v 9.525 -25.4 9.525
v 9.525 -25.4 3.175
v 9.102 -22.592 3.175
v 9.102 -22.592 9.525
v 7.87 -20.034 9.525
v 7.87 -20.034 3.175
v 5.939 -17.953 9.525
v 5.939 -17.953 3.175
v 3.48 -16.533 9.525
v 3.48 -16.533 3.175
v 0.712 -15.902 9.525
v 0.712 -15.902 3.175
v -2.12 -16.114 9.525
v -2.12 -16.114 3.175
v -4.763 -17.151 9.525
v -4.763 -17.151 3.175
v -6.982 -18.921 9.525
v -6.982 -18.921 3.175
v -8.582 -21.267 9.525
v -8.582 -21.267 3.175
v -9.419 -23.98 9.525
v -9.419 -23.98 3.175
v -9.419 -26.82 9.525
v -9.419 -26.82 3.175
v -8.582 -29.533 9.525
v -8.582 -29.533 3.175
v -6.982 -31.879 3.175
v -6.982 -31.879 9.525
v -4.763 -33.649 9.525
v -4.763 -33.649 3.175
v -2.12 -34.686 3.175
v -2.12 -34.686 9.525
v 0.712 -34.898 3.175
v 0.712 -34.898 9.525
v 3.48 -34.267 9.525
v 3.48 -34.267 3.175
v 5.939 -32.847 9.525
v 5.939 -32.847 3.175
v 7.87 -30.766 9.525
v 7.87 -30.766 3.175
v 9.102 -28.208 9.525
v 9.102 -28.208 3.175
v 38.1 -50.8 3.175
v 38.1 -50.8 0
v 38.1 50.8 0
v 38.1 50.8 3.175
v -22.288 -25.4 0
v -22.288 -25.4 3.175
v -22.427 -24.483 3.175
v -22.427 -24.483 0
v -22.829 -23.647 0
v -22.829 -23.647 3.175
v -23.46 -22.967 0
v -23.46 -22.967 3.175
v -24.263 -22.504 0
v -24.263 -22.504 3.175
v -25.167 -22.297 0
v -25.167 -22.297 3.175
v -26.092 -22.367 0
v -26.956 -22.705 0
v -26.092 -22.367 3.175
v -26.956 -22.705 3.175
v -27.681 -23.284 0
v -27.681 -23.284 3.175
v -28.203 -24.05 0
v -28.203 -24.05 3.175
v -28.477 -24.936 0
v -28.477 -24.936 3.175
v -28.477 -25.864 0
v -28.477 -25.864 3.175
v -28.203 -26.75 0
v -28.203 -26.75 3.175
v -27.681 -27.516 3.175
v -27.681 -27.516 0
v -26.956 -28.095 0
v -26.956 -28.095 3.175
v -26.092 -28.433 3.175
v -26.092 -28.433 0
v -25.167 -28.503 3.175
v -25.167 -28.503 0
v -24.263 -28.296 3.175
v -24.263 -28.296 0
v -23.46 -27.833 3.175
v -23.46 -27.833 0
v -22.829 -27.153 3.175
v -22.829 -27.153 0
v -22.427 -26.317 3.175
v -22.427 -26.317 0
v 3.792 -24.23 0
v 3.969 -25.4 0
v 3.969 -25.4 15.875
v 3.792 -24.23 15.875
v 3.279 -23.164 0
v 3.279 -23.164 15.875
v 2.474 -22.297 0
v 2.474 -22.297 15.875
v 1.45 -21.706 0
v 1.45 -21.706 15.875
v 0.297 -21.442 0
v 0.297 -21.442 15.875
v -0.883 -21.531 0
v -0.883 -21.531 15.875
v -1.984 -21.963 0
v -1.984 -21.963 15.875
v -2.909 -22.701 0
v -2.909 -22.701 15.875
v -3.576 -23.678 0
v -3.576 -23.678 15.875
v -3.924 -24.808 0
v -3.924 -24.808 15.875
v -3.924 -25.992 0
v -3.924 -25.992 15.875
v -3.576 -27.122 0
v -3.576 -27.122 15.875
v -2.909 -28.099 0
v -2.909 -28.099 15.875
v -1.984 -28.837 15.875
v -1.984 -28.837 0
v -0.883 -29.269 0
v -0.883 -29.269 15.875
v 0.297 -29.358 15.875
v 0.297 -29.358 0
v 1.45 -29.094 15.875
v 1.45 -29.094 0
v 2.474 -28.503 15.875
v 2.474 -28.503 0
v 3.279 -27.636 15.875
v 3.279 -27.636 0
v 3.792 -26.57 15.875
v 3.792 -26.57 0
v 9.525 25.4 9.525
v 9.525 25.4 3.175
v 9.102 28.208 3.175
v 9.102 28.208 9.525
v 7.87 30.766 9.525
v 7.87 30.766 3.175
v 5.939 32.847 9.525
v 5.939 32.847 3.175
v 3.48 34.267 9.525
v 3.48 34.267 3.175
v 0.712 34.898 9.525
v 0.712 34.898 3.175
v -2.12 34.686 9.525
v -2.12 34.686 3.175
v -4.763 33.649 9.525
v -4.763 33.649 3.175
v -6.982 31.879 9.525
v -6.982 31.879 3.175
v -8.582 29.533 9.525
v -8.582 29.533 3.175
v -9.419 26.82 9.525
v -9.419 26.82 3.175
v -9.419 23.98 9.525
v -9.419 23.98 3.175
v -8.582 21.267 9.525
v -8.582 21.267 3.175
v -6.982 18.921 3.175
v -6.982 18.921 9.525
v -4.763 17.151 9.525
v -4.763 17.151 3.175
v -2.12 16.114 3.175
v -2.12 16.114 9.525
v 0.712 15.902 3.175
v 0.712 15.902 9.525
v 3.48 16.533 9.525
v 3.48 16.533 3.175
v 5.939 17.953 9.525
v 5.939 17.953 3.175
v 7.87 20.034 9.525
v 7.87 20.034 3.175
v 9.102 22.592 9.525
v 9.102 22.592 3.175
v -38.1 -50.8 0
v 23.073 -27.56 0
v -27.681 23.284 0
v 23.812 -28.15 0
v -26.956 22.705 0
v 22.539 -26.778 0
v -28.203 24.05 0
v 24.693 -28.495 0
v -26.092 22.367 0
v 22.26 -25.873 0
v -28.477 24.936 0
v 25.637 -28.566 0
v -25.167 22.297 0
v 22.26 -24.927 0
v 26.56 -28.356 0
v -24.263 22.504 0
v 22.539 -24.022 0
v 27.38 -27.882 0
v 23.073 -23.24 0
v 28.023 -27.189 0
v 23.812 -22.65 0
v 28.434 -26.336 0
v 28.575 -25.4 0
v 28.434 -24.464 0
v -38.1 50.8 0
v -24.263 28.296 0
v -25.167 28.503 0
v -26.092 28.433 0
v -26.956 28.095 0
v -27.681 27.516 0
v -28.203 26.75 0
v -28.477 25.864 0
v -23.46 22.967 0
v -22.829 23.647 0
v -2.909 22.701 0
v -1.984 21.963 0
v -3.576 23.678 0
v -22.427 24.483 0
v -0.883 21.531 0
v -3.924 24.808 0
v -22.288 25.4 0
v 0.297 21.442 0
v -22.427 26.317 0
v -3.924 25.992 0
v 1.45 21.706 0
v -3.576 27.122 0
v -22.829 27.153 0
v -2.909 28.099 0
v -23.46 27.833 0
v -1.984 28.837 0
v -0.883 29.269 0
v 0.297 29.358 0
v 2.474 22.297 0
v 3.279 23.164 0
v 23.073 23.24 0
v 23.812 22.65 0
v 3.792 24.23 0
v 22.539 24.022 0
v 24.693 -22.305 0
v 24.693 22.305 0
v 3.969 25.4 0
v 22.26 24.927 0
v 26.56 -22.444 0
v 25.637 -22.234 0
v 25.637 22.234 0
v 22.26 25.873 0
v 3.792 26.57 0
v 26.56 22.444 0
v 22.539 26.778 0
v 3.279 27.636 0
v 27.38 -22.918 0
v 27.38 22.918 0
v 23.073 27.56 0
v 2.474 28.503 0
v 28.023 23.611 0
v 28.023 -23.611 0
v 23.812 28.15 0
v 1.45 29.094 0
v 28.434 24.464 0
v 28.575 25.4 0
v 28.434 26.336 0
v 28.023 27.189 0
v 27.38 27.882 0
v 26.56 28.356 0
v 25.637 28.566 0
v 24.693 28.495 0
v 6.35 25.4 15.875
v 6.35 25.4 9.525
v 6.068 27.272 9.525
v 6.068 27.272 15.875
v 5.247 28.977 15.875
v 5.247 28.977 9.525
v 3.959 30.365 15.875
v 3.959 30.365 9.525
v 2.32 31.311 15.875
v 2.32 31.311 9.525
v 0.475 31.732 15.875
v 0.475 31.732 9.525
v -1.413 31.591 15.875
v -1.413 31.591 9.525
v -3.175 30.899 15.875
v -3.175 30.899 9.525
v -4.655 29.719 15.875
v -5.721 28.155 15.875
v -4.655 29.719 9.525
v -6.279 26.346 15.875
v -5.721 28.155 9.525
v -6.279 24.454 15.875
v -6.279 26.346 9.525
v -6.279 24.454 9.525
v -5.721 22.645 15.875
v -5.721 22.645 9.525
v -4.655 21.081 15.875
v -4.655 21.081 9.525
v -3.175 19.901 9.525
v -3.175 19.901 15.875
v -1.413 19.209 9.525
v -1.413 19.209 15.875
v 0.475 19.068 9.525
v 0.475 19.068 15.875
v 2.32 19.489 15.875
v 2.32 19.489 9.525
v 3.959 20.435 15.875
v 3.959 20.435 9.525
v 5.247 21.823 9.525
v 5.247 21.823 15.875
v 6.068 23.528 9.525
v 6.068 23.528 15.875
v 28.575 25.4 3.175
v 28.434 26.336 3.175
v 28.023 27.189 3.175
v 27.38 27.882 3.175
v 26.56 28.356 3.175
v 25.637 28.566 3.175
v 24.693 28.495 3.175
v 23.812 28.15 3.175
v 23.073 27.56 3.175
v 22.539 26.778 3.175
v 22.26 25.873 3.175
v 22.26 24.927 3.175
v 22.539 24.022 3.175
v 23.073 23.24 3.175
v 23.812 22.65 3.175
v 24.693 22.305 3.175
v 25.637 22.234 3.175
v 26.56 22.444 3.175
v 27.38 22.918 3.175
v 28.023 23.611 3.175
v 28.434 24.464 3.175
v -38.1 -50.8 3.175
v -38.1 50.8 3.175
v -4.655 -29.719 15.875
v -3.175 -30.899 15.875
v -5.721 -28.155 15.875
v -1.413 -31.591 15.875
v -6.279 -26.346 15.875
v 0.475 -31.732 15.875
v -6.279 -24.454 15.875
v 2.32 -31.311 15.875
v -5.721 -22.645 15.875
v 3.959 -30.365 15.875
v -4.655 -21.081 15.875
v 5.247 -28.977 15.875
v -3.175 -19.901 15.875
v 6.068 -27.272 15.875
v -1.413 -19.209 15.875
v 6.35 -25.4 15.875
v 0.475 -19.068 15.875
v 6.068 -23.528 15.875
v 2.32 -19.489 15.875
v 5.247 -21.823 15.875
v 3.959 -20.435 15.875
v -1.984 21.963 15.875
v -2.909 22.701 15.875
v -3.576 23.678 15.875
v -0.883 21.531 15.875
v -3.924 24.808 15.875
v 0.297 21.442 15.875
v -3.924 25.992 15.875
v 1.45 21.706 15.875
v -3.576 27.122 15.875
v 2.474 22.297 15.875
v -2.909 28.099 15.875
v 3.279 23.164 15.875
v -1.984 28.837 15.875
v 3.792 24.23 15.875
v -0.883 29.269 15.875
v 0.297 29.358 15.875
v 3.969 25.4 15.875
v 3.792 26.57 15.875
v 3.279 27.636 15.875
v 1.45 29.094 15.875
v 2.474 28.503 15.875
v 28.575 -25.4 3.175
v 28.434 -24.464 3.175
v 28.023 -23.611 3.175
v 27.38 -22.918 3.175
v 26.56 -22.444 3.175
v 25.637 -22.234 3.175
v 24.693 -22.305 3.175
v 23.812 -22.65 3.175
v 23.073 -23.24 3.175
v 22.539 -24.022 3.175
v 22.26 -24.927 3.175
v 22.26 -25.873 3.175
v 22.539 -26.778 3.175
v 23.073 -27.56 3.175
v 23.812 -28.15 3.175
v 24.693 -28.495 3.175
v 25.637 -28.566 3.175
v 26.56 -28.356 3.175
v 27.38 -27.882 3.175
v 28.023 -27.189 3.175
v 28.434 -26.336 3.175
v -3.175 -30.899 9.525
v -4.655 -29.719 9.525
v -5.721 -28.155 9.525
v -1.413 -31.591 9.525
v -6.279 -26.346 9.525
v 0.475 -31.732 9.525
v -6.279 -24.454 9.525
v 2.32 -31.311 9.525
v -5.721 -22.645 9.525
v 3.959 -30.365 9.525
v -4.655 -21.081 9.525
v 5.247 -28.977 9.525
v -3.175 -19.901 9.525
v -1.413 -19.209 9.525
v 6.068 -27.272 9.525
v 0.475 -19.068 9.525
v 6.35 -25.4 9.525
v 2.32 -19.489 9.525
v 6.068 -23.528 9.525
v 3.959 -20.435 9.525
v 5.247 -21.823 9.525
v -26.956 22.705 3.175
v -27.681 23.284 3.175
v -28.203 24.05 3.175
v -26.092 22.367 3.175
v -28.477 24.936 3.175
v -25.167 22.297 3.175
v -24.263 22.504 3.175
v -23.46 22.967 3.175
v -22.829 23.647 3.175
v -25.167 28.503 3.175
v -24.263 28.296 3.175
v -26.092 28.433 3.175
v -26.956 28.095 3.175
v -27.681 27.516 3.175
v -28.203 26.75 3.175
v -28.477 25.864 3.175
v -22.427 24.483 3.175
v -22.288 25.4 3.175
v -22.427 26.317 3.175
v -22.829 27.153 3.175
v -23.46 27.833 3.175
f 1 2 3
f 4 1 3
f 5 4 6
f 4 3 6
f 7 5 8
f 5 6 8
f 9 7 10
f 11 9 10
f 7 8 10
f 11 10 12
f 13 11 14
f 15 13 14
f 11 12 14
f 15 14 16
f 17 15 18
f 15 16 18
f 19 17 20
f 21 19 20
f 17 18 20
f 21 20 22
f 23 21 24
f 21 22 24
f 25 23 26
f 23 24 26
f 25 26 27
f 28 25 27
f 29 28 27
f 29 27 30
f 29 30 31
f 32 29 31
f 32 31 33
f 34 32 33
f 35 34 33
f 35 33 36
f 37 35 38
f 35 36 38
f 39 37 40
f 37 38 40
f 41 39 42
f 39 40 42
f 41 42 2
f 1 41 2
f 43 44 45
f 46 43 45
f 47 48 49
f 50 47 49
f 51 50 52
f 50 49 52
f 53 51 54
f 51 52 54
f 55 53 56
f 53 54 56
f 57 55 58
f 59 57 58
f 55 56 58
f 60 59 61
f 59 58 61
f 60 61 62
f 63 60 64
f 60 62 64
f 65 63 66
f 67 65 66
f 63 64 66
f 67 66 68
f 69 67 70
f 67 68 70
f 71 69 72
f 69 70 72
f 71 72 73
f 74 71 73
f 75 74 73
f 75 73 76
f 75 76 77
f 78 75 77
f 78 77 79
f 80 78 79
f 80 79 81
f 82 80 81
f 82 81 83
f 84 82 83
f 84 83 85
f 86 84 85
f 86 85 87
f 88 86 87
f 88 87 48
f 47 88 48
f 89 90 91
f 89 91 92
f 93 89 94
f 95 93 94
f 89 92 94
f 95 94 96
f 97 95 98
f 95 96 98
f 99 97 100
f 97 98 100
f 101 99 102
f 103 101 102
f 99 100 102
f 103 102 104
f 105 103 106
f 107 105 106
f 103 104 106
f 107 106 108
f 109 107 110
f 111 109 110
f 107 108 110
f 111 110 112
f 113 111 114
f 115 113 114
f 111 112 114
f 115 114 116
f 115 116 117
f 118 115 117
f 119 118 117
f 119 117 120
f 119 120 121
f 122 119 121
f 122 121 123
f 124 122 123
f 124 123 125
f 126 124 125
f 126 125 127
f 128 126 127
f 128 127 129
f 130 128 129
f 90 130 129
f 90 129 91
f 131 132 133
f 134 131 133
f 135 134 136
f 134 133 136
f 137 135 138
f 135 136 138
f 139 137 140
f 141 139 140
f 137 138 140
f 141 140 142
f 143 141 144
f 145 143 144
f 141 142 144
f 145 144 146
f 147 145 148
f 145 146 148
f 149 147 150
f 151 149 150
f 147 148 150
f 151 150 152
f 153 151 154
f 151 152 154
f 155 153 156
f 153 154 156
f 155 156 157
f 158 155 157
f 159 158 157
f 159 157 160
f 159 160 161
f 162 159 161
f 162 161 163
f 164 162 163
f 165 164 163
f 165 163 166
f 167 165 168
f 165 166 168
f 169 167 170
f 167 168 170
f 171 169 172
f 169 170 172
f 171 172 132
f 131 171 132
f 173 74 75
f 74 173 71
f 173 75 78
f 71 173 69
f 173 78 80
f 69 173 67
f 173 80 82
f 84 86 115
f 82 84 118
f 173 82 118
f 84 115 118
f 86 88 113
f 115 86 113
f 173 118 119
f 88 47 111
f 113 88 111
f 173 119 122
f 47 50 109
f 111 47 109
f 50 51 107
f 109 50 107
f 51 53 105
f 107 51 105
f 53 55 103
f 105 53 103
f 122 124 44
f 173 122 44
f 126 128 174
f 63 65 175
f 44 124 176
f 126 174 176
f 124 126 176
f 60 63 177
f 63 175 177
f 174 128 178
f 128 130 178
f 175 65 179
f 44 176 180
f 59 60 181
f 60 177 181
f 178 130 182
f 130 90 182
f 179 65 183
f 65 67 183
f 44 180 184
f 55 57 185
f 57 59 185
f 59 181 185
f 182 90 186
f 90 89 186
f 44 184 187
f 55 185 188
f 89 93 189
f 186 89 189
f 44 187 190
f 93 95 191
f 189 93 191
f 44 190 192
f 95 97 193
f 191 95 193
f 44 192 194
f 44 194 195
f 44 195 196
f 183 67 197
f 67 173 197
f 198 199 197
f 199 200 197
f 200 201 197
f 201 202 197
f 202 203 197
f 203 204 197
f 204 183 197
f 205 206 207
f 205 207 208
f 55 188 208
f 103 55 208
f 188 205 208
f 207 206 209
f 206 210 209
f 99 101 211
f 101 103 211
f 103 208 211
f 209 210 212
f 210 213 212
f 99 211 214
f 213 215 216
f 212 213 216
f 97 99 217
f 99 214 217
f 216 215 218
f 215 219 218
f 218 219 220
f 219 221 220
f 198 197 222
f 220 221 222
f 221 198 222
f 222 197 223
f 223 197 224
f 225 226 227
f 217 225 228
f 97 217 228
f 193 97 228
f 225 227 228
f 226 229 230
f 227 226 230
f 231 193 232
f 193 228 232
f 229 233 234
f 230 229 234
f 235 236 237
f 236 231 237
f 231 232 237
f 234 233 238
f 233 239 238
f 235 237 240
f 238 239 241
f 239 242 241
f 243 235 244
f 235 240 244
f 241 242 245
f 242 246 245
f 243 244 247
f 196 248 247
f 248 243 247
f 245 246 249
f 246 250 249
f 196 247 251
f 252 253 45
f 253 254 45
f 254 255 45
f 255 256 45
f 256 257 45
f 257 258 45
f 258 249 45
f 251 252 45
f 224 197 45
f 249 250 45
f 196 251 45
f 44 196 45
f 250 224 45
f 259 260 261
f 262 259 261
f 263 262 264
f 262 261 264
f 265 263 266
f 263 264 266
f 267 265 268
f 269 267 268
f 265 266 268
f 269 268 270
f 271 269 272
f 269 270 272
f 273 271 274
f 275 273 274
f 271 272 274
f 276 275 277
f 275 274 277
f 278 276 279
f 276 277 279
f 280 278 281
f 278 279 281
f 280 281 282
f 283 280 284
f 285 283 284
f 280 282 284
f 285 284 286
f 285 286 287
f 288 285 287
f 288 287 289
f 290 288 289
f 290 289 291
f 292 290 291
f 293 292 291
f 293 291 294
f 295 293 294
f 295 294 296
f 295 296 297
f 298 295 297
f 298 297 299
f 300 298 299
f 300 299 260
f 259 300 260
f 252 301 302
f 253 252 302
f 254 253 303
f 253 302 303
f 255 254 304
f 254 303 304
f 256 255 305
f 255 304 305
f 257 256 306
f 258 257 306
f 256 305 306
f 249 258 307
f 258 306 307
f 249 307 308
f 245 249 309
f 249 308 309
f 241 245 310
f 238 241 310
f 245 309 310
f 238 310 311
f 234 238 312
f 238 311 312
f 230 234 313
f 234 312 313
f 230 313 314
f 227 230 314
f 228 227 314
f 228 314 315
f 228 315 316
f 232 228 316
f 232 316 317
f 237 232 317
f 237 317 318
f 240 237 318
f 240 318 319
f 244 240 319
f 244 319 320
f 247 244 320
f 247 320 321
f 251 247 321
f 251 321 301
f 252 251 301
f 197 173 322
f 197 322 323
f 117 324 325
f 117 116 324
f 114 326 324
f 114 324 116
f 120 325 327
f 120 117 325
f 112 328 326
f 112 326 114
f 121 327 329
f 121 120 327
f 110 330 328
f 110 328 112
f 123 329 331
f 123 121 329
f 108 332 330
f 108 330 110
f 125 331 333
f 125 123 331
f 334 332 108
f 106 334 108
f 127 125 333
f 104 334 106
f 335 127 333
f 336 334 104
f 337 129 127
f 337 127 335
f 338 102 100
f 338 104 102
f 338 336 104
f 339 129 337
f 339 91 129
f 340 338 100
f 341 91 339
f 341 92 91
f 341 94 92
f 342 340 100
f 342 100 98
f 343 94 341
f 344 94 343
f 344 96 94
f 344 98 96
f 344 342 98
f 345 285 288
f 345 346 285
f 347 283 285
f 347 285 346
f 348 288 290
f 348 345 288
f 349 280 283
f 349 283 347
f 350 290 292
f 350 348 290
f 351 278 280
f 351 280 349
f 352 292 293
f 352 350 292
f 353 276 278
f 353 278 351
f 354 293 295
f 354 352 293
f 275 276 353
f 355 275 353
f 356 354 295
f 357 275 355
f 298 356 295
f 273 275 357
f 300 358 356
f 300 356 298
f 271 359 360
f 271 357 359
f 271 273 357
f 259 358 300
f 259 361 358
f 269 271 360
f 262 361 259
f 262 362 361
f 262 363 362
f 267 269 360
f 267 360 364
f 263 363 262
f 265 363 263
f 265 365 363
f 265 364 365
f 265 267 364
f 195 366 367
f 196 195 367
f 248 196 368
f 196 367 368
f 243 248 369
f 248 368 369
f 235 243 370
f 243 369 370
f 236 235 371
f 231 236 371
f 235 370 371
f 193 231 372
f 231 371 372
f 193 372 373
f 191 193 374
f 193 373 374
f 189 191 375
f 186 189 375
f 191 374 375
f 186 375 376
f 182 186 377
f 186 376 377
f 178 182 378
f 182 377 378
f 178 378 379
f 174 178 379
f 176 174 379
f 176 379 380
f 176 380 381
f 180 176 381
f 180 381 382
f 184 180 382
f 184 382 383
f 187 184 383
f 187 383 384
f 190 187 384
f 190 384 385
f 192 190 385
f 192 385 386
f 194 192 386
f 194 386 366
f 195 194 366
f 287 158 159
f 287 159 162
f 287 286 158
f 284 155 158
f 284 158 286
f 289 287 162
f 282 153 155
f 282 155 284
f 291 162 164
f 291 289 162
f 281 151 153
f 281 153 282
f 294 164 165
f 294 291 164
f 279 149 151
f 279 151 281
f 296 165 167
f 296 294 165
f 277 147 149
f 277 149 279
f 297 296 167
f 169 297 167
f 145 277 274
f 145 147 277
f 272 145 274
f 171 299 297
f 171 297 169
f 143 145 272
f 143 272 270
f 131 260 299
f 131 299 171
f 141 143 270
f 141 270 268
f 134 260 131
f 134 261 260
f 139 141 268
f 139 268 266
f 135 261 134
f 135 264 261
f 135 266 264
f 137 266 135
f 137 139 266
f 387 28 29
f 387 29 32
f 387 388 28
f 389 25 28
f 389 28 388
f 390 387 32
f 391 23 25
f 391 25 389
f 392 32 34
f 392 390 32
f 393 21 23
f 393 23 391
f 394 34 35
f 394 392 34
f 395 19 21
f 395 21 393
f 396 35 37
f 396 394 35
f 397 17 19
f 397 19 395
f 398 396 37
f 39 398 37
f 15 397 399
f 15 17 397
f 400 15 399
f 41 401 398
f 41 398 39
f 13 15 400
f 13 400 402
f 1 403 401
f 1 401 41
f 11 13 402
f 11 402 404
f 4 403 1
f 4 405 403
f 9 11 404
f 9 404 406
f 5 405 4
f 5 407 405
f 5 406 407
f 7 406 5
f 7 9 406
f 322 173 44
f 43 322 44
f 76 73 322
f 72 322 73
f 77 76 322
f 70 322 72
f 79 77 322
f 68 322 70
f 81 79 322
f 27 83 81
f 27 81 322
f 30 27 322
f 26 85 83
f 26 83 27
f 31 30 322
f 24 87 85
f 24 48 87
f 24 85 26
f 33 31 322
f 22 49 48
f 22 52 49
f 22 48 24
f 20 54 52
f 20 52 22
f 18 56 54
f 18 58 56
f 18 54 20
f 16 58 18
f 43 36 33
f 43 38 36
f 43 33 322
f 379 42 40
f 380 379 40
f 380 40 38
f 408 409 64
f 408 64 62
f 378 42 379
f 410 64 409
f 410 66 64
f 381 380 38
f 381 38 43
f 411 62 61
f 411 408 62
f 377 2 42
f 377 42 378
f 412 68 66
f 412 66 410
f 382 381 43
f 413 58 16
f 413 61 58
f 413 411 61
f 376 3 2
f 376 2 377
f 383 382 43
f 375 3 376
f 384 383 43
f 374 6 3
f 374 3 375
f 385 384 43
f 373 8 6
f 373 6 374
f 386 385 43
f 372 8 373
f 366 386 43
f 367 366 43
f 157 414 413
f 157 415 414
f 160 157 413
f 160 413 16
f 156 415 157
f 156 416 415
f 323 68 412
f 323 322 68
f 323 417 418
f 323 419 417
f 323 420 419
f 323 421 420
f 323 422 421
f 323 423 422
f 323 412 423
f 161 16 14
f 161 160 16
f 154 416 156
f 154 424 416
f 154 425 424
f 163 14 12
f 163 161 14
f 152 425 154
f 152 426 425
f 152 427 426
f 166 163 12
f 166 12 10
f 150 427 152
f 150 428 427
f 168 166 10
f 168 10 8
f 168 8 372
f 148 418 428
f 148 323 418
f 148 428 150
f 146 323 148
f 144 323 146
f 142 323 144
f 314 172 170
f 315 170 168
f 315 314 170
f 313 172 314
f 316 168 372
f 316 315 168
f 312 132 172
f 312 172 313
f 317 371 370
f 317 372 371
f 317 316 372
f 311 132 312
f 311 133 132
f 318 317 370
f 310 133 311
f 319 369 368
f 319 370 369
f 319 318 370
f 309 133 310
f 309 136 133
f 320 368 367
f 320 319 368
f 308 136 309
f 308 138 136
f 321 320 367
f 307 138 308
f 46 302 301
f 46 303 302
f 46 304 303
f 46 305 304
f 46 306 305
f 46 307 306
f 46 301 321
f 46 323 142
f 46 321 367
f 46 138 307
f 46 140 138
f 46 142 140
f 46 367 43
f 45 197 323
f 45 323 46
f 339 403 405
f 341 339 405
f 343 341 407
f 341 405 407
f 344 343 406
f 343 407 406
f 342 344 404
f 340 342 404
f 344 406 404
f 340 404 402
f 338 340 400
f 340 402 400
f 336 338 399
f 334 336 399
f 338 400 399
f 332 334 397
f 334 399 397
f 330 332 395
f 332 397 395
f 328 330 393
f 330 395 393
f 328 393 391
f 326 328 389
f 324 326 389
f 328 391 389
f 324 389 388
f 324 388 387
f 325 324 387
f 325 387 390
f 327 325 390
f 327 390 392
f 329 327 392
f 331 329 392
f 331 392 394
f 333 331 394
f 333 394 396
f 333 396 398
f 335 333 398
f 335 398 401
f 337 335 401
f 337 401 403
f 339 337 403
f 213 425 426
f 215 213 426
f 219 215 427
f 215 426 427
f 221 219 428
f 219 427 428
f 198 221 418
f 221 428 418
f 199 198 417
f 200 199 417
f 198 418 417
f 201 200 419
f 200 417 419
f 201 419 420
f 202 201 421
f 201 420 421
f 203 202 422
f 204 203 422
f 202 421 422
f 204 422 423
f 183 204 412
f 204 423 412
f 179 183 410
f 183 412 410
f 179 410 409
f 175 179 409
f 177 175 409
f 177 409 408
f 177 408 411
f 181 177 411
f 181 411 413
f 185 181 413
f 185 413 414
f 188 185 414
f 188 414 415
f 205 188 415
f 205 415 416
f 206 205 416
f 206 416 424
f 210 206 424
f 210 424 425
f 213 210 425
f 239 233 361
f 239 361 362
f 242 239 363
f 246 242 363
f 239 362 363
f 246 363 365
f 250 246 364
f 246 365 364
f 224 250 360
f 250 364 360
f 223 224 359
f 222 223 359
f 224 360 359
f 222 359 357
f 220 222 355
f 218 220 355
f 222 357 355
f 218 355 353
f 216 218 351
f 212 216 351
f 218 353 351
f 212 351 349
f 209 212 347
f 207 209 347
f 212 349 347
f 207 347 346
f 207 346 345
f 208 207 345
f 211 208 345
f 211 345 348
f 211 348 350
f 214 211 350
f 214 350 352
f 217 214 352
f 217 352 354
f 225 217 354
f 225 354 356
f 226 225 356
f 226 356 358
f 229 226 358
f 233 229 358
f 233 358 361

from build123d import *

# Parameters (mm, degrees)
F0_W      = 76.2
F0_H      = 101.6
F1_DEPTH  = 3.175
F2_R      = 6.35
F3_DEPTH  = 12.7
F4_R      = 3.96875
F5_R      = 3.96875
F6_DEPTH  = 38.1
F7_R      = 3.175
F7_R_2    = 3.1115
F8_DEPTH  = 25.4
F9_R      = 9.525
F9_R_2    = 6.35
F10_DEPTH = 6.35


with BuildPart() as f1:
    # F0 (on Top) → F1 (new body)
    with BuildSketch(Plane.XY):
        Rectangle(F0_W, F0_H)
    extrude(amount=F1_DEPTH)

    # F2 (on face) → F3 (join)
    with BuildSketch(Plane.XY.offset(3.175)):
        with Locations((0, 25.4)):
            Circle(F2_R)
        with Locations((0, -25.4)):
            Circle(F2_R)
    extrude(amount=F3_DEPTH)

    # F4 (on face) + F5 (on face) → F6 (cut)
    with BuildSketch(Plane.XY.offset(15.875)):
        with Locations((0, 25.4)):
            Circle(F4_R)
    with BuildSketch(Plane.XY.offset(15.875)):
        with Locations((0, -25.4)):
            Circle(F5_R)
    extrude(amount=-F6_DEPTH, mode=Mode.SUBTRACT)

    # F7 (on face) → F8 (cut)
    with BuildSketch(Plane.XY.offset(3.175)):
        with Locations((25.4, 25.4)):
            Circle(F7_R)
        with Locations((25.4, -25.4)):
            Circle(F7_R)
        with Locations((-25.4, 25.4)):
            Circle(F7_R_2)
        with Locations((-25.4, -25.4)):
            Circle(F7_R_2)
    extrude(amount=-F8_DEPTH, mode=Mode.SUBTRACT)

    # F9 (on face) → F10 (join)
    with BuildSketch(Plane.XY.offset(3.175)):
        with Locations((0, 25.4)):
            Circle(F9_R)
        with Locations((0, 25.4)):
            Circle(F9_R_2, mode=Mode.SUBTRACT)
        with Locations((0, -25.4)):
            Circle(F9_R)
        with Locations((0, -25.4)):
            Circle(F9_R_2, mode=Mode.SUBTRACT)
    extrude(amount=F10_DEPTH)


solid = f1.part
